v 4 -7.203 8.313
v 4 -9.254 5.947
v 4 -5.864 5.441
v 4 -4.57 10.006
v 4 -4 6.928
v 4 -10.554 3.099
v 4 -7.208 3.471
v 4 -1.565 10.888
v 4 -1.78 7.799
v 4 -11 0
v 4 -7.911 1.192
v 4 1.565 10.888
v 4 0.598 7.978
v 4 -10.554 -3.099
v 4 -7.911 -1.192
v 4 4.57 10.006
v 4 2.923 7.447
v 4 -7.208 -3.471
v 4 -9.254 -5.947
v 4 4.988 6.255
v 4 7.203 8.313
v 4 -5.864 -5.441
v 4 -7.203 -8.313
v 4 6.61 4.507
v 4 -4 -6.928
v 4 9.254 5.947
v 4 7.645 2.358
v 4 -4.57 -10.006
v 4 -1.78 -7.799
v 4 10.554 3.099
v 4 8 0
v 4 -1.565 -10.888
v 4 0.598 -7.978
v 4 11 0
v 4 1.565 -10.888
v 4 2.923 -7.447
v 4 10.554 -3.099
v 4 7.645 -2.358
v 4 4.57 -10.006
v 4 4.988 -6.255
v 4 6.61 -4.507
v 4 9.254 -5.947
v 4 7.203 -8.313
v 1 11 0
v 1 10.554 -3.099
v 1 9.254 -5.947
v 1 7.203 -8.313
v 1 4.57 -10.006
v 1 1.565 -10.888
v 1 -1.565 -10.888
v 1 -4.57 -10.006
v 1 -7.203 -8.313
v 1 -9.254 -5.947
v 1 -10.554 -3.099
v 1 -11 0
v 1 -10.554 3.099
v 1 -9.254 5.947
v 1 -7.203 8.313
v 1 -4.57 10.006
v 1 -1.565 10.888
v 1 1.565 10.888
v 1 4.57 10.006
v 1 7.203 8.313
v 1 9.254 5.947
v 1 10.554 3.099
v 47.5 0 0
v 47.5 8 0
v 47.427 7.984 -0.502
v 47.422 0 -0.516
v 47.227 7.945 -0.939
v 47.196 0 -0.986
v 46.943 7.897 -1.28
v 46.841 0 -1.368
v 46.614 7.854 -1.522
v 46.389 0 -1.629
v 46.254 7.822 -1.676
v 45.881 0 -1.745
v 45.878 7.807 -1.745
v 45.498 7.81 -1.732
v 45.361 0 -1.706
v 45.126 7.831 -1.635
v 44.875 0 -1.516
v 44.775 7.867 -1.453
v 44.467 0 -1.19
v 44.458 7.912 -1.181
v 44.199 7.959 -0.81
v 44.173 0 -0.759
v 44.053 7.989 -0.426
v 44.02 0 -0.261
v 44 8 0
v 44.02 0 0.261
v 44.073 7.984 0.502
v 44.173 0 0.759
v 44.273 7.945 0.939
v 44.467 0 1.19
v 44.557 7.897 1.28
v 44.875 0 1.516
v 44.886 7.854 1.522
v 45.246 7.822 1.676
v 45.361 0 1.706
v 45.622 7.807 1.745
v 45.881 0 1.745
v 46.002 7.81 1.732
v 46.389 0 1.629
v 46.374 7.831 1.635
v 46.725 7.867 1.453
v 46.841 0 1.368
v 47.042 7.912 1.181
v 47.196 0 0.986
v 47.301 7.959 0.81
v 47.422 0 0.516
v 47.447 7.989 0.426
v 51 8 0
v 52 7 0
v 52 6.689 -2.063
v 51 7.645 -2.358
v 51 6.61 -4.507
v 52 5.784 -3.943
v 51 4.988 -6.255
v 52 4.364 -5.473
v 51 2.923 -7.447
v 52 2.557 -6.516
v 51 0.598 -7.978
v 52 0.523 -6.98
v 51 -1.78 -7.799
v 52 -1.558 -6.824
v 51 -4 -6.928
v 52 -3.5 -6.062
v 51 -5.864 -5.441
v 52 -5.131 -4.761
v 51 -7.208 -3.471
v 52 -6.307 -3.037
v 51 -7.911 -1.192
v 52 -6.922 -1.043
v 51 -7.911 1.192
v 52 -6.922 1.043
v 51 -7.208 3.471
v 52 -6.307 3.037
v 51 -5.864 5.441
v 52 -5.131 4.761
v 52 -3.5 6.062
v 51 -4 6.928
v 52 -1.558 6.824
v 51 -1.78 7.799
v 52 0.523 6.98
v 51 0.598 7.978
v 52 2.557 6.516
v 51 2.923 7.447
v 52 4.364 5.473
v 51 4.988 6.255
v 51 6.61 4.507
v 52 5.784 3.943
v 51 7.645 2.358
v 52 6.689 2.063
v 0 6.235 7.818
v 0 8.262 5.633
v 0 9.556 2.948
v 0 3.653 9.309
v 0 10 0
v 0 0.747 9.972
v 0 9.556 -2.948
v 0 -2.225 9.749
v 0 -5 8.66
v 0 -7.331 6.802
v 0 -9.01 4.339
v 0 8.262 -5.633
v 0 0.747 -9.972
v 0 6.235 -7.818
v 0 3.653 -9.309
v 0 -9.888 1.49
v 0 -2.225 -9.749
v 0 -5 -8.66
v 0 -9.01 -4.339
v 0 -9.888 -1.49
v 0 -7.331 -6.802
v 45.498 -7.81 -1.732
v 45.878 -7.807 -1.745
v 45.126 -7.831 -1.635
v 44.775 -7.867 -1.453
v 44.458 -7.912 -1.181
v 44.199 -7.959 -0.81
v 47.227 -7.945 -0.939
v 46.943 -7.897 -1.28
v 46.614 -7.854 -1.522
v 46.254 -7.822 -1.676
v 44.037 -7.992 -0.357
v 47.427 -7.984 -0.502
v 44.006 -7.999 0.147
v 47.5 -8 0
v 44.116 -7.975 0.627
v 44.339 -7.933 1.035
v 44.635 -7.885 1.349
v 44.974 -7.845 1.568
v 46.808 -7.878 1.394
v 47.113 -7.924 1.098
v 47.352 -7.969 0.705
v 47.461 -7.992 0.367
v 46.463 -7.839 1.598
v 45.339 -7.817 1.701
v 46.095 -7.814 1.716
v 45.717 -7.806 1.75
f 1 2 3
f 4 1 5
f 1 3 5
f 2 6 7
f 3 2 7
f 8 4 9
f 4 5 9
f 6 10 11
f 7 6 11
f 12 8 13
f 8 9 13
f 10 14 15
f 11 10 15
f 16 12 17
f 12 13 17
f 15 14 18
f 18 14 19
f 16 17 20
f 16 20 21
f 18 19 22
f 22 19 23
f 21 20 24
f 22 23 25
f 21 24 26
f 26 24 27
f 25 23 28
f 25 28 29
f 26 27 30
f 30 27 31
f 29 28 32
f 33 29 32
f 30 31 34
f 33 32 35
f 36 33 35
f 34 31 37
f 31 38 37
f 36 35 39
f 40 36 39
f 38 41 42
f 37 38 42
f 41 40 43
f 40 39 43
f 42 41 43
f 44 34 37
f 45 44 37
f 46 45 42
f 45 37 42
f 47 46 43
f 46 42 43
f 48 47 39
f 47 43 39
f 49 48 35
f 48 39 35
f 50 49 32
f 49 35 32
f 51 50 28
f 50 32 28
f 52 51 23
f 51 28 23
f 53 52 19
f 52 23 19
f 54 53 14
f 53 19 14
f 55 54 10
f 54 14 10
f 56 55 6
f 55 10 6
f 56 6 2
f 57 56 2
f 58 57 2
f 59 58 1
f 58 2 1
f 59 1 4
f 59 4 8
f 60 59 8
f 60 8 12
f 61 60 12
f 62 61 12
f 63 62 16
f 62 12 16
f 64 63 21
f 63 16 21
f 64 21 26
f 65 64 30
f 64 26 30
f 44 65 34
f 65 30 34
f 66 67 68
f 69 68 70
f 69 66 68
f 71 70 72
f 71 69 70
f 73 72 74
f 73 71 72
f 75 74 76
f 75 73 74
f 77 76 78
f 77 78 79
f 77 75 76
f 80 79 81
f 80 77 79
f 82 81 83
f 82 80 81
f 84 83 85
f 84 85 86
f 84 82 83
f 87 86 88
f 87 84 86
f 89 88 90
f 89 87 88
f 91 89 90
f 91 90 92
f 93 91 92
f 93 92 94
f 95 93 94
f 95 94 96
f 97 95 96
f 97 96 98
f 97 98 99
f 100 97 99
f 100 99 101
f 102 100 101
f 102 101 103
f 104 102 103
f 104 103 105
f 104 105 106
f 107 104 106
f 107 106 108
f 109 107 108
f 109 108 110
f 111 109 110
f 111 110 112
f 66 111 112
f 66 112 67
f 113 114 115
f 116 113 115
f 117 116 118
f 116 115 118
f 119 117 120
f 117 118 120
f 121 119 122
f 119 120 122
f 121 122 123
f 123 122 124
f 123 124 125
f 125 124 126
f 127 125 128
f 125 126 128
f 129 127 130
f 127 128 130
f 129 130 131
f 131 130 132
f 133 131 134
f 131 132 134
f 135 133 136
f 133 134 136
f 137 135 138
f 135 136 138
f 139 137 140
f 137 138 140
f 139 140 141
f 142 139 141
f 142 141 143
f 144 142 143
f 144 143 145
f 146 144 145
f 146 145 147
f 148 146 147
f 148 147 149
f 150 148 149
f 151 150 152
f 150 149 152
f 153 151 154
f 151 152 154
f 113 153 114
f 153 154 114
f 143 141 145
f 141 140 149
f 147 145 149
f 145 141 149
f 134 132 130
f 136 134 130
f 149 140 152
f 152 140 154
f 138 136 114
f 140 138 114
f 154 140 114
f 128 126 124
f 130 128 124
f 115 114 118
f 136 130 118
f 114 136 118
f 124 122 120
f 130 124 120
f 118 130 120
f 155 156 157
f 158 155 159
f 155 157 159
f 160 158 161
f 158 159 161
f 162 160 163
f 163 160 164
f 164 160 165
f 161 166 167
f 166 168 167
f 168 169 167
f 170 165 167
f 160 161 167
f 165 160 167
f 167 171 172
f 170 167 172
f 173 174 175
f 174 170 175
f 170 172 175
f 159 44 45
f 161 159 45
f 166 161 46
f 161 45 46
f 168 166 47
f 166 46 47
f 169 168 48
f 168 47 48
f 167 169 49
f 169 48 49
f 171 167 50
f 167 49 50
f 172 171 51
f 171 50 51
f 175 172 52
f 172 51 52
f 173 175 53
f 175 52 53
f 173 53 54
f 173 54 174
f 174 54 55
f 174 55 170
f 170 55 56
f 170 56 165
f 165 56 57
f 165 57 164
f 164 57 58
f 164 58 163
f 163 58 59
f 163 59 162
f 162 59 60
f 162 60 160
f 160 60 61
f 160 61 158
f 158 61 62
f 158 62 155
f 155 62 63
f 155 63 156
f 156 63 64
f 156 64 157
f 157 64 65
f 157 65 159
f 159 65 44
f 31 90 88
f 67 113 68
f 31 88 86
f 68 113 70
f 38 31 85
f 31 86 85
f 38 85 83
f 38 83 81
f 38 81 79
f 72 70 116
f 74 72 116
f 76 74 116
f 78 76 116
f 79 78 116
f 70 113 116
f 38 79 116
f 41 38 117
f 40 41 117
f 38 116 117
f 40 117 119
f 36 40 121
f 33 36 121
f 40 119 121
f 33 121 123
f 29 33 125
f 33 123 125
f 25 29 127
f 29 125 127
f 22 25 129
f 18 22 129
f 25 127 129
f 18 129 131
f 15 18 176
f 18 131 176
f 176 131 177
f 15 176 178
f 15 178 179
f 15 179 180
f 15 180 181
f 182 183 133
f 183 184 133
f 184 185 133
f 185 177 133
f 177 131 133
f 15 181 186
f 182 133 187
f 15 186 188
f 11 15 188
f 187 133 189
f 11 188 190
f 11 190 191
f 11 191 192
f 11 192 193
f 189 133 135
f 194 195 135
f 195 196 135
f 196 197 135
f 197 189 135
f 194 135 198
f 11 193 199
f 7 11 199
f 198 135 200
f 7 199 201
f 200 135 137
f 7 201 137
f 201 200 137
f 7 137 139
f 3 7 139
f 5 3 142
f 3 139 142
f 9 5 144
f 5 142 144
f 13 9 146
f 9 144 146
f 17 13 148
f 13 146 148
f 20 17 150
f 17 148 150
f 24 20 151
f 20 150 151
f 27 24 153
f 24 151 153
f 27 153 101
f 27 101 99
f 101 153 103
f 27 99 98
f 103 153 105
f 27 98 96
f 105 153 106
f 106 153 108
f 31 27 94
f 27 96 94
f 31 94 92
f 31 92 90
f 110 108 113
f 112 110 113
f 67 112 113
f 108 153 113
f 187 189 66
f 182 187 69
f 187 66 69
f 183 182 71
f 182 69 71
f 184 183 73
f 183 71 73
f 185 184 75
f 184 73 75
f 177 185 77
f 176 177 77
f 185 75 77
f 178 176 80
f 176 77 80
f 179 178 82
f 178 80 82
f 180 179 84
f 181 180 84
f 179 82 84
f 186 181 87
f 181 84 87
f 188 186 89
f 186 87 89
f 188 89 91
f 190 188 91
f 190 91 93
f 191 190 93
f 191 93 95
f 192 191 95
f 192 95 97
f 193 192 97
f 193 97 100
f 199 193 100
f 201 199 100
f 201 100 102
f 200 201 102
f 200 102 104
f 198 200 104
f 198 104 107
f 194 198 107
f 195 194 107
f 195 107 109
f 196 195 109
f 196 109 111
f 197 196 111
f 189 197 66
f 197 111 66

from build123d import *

# Parameters (mm, degrees)
SZKIC2_R                        = 1.75
WYTNIJ_WYCI_GNI_CIE1_DEPTH      = 12
WYTNIJ_WYCI_GNI_CIE1_DEPTH_BACK = 12
SFAZOWANIE1_SIZE                = 1


with BuildPart() as part:
    # Szkic1 → Obrót1 (revolve)
    with BuildSketch(Plane.XY):
        Polygon((0, 0), (0, 11), (4, 11), (4, 8), (52, 8), (52, 0), align=None)
    revolve(axis=Axis((52, 0, 0), (-1, 0, 0)))

    # Szkic2 → Wytnij-wyciągnięcie1 (cut, two sides)
    with BuildSketch(Plane(origin=(0, 0, 0), x_dir=(1, 0, 0), z_dir=(0, 1, 0))) as wytnij_wyci_gni_cie1_sk:
        with Locations((45.75, 0)):
            Circle(SZKIC2_R)
    extrude(amount=WYTNIJ_WYCI_GNI_CIE1_DEPTH, mode=Mode.SUBTRACT)
    extrude(wytnij_wyci_gni_cie1_sk.sketch, amount=-WYTNIJ_WYCI_GNI_CIE1_DEPTH_BACK, mode=Mode.SUBTRACT)

    # Sfazowanie1
    sfazowanie1_edges = [part.edges().sort_by_distance(p)[0] for p in [
        (52, -8, 0),
        (0, -11, 0),
    ]]
    chamfer(sfazowanie1_edges, length=SFAZOWANIE1_SIZE)


solid = part.part
